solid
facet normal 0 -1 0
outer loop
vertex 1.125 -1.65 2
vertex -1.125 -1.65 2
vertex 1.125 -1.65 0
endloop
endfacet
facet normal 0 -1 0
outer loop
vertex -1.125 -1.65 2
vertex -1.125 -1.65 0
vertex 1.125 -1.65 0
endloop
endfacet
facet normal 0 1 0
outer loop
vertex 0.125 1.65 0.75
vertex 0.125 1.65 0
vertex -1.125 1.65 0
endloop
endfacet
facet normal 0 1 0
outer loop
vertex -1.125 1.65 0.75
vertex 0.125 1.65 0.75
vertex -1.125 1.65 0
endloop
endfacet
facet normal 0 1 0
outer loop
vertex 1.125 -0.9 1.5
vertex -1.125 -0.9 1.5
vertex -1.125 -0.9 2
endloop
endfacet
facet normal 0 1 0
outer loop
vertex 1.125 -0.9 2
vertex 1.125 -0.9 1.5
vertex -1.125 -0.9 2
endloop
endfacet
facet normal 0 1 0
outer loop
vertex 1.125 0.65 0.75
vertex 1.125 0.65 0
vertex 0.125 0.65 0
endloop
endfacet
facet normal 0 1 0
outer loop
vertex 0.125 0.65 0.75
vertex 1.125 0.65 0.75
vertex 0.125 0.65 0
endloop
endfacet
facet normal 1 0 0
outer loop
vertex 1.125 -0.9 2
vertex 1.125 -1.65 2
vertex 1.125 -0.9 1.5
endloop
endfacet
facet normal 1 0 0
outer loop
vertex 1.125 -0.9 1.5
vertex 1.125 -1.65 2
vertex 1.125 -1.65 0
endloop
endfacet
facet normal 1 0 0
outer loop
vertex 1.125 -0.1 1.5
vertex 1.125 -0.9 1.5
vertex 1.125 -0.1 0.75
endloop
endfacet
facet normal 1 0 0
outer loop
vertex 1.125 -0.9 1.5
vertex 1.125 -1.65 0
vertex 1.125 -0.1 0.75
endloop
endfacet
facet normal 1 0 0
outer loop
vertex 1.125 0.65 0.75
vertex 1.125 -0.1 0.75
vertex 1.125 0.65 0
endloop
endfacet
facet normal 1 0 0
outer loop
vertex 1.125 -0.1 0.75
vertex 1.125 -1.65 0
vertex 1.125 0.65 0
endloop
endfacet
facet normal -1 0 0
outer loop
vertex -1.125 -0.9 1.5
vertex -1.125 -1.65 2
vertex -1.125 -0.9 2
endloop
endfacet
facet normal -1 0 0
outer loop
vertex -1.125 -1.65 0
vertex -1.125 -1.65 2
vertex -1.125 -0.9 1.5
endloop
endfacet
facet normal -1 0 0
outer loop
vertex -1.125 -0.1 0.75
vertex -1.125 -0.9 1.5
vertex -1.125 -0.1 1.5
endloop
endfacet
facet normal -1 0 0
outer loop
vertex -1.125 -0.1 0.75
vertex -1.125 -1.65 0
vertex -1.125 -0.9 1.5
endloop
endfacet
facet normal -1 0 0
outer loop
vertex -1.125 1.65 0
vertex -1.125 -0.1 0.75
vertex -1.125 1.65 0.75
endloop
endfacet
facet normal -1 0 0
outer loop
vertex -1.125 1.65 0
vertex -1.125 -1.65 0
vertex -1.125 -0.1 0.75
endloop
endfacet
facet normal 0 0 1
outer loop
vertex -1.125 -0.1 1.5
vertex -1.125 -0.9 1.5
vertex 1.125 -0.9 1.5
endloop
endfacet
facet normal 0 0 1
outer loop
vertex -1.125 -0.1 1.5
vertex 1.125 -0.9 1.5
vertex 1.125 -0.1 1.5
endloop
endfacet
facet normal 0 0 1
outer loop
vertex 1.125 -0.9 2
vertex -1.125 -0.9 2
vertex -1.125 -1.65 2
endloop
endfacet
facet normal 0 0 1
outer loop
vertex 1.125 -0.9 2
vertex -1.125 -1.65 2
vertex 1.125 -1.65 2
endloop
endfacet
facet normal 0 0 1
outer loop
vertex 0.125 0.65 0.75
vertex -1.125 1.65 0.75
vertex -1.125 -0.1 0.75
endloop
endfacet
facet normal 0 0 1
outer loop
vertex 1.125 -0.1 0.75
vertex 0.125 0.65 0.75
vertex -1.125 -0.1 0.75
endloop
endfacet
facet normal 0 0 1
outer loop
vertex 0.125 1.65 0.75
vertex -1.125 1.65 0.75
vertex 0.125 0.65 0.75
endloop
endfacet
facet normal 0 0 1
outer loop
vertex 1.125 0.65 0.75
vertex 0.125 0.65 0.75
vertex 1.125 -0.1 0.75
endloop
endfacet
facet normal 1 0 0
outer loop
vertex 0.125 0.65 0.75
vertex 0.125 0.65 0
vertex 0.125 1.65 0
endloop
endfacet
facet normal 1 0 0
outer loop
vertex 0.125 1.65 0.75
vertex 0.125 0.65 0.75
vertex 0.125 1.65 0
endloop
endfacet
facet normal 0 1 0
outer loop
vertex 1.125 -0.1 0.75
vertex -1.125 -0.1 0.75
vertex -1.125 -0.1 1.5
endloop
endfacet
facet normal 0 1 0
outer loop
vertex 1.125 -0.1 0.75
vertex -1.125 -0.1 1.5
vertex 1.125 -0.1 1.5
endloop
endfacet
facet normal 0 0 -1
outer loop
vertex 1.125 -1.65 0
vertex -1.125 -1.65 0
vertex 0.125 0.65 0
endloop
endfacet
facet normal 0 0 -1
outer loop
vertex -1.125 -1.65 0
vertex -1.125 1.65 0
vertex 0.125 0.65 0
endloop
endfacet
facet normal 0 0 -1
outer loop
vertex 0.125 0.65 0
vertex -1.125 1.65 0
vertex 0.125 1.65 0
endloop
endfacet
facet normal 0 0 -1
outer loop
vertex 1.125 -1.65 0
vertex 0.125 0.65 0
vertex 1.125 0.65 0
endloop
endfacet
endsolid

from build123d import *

# Parameters (mm, degrees)
RESSALTO_EXTRUS_O1_DEPTH = 0.75
ESBO_O2_W                = 2.25
ESBO_O2_H                = 1.55
RESSALTO_EXTRUS_O2_DEPTH = 1.25
ESBO_O4_W                = 0.5
ESBO_O4_H                = 0.8
CORTE_EXTRUS_O1_DEPTH    = 4.432928779


with BuildPart() as part:
    # Esboço1 → Ressalto-extrusão1 (new body)
    with BuildSketch(Plane.XY):
        Polygon((-1.125, -1.65), (1.125, -1.65), (1.125, 0.65), (0.125, 0.65), (0.125, 1.65), (-1.125, 1.65), align=None)
    extrude(amount=RESSALTO_EXTRUS_O1_DEPTH)

    # Esboço2 → Ressalto-extrusão2 (add)
    with BuildSketch(Plane.XY.offset(0.75)):
        with Locations((0, -0.875)):
            Rectangle(ESBO_O2_W, ESBO_O2_H)
    extrude(amount=RESSALTO_EXTRUS_O2_DEPTH)

    # Esboço4 → Corte-extrusão1 (cut, through all)
    with BuildSketch(Plane.ZY.offset(1.125)):
        with Locations((1.75, -0.5)):
            Rectangle(ESBO_O4_W, ESBO_O4_H)
    extrude(amount=-CORTE_EXTRUS_O1_DEPTH, mode=Mode.SUBTRACT)


solid = part.part
